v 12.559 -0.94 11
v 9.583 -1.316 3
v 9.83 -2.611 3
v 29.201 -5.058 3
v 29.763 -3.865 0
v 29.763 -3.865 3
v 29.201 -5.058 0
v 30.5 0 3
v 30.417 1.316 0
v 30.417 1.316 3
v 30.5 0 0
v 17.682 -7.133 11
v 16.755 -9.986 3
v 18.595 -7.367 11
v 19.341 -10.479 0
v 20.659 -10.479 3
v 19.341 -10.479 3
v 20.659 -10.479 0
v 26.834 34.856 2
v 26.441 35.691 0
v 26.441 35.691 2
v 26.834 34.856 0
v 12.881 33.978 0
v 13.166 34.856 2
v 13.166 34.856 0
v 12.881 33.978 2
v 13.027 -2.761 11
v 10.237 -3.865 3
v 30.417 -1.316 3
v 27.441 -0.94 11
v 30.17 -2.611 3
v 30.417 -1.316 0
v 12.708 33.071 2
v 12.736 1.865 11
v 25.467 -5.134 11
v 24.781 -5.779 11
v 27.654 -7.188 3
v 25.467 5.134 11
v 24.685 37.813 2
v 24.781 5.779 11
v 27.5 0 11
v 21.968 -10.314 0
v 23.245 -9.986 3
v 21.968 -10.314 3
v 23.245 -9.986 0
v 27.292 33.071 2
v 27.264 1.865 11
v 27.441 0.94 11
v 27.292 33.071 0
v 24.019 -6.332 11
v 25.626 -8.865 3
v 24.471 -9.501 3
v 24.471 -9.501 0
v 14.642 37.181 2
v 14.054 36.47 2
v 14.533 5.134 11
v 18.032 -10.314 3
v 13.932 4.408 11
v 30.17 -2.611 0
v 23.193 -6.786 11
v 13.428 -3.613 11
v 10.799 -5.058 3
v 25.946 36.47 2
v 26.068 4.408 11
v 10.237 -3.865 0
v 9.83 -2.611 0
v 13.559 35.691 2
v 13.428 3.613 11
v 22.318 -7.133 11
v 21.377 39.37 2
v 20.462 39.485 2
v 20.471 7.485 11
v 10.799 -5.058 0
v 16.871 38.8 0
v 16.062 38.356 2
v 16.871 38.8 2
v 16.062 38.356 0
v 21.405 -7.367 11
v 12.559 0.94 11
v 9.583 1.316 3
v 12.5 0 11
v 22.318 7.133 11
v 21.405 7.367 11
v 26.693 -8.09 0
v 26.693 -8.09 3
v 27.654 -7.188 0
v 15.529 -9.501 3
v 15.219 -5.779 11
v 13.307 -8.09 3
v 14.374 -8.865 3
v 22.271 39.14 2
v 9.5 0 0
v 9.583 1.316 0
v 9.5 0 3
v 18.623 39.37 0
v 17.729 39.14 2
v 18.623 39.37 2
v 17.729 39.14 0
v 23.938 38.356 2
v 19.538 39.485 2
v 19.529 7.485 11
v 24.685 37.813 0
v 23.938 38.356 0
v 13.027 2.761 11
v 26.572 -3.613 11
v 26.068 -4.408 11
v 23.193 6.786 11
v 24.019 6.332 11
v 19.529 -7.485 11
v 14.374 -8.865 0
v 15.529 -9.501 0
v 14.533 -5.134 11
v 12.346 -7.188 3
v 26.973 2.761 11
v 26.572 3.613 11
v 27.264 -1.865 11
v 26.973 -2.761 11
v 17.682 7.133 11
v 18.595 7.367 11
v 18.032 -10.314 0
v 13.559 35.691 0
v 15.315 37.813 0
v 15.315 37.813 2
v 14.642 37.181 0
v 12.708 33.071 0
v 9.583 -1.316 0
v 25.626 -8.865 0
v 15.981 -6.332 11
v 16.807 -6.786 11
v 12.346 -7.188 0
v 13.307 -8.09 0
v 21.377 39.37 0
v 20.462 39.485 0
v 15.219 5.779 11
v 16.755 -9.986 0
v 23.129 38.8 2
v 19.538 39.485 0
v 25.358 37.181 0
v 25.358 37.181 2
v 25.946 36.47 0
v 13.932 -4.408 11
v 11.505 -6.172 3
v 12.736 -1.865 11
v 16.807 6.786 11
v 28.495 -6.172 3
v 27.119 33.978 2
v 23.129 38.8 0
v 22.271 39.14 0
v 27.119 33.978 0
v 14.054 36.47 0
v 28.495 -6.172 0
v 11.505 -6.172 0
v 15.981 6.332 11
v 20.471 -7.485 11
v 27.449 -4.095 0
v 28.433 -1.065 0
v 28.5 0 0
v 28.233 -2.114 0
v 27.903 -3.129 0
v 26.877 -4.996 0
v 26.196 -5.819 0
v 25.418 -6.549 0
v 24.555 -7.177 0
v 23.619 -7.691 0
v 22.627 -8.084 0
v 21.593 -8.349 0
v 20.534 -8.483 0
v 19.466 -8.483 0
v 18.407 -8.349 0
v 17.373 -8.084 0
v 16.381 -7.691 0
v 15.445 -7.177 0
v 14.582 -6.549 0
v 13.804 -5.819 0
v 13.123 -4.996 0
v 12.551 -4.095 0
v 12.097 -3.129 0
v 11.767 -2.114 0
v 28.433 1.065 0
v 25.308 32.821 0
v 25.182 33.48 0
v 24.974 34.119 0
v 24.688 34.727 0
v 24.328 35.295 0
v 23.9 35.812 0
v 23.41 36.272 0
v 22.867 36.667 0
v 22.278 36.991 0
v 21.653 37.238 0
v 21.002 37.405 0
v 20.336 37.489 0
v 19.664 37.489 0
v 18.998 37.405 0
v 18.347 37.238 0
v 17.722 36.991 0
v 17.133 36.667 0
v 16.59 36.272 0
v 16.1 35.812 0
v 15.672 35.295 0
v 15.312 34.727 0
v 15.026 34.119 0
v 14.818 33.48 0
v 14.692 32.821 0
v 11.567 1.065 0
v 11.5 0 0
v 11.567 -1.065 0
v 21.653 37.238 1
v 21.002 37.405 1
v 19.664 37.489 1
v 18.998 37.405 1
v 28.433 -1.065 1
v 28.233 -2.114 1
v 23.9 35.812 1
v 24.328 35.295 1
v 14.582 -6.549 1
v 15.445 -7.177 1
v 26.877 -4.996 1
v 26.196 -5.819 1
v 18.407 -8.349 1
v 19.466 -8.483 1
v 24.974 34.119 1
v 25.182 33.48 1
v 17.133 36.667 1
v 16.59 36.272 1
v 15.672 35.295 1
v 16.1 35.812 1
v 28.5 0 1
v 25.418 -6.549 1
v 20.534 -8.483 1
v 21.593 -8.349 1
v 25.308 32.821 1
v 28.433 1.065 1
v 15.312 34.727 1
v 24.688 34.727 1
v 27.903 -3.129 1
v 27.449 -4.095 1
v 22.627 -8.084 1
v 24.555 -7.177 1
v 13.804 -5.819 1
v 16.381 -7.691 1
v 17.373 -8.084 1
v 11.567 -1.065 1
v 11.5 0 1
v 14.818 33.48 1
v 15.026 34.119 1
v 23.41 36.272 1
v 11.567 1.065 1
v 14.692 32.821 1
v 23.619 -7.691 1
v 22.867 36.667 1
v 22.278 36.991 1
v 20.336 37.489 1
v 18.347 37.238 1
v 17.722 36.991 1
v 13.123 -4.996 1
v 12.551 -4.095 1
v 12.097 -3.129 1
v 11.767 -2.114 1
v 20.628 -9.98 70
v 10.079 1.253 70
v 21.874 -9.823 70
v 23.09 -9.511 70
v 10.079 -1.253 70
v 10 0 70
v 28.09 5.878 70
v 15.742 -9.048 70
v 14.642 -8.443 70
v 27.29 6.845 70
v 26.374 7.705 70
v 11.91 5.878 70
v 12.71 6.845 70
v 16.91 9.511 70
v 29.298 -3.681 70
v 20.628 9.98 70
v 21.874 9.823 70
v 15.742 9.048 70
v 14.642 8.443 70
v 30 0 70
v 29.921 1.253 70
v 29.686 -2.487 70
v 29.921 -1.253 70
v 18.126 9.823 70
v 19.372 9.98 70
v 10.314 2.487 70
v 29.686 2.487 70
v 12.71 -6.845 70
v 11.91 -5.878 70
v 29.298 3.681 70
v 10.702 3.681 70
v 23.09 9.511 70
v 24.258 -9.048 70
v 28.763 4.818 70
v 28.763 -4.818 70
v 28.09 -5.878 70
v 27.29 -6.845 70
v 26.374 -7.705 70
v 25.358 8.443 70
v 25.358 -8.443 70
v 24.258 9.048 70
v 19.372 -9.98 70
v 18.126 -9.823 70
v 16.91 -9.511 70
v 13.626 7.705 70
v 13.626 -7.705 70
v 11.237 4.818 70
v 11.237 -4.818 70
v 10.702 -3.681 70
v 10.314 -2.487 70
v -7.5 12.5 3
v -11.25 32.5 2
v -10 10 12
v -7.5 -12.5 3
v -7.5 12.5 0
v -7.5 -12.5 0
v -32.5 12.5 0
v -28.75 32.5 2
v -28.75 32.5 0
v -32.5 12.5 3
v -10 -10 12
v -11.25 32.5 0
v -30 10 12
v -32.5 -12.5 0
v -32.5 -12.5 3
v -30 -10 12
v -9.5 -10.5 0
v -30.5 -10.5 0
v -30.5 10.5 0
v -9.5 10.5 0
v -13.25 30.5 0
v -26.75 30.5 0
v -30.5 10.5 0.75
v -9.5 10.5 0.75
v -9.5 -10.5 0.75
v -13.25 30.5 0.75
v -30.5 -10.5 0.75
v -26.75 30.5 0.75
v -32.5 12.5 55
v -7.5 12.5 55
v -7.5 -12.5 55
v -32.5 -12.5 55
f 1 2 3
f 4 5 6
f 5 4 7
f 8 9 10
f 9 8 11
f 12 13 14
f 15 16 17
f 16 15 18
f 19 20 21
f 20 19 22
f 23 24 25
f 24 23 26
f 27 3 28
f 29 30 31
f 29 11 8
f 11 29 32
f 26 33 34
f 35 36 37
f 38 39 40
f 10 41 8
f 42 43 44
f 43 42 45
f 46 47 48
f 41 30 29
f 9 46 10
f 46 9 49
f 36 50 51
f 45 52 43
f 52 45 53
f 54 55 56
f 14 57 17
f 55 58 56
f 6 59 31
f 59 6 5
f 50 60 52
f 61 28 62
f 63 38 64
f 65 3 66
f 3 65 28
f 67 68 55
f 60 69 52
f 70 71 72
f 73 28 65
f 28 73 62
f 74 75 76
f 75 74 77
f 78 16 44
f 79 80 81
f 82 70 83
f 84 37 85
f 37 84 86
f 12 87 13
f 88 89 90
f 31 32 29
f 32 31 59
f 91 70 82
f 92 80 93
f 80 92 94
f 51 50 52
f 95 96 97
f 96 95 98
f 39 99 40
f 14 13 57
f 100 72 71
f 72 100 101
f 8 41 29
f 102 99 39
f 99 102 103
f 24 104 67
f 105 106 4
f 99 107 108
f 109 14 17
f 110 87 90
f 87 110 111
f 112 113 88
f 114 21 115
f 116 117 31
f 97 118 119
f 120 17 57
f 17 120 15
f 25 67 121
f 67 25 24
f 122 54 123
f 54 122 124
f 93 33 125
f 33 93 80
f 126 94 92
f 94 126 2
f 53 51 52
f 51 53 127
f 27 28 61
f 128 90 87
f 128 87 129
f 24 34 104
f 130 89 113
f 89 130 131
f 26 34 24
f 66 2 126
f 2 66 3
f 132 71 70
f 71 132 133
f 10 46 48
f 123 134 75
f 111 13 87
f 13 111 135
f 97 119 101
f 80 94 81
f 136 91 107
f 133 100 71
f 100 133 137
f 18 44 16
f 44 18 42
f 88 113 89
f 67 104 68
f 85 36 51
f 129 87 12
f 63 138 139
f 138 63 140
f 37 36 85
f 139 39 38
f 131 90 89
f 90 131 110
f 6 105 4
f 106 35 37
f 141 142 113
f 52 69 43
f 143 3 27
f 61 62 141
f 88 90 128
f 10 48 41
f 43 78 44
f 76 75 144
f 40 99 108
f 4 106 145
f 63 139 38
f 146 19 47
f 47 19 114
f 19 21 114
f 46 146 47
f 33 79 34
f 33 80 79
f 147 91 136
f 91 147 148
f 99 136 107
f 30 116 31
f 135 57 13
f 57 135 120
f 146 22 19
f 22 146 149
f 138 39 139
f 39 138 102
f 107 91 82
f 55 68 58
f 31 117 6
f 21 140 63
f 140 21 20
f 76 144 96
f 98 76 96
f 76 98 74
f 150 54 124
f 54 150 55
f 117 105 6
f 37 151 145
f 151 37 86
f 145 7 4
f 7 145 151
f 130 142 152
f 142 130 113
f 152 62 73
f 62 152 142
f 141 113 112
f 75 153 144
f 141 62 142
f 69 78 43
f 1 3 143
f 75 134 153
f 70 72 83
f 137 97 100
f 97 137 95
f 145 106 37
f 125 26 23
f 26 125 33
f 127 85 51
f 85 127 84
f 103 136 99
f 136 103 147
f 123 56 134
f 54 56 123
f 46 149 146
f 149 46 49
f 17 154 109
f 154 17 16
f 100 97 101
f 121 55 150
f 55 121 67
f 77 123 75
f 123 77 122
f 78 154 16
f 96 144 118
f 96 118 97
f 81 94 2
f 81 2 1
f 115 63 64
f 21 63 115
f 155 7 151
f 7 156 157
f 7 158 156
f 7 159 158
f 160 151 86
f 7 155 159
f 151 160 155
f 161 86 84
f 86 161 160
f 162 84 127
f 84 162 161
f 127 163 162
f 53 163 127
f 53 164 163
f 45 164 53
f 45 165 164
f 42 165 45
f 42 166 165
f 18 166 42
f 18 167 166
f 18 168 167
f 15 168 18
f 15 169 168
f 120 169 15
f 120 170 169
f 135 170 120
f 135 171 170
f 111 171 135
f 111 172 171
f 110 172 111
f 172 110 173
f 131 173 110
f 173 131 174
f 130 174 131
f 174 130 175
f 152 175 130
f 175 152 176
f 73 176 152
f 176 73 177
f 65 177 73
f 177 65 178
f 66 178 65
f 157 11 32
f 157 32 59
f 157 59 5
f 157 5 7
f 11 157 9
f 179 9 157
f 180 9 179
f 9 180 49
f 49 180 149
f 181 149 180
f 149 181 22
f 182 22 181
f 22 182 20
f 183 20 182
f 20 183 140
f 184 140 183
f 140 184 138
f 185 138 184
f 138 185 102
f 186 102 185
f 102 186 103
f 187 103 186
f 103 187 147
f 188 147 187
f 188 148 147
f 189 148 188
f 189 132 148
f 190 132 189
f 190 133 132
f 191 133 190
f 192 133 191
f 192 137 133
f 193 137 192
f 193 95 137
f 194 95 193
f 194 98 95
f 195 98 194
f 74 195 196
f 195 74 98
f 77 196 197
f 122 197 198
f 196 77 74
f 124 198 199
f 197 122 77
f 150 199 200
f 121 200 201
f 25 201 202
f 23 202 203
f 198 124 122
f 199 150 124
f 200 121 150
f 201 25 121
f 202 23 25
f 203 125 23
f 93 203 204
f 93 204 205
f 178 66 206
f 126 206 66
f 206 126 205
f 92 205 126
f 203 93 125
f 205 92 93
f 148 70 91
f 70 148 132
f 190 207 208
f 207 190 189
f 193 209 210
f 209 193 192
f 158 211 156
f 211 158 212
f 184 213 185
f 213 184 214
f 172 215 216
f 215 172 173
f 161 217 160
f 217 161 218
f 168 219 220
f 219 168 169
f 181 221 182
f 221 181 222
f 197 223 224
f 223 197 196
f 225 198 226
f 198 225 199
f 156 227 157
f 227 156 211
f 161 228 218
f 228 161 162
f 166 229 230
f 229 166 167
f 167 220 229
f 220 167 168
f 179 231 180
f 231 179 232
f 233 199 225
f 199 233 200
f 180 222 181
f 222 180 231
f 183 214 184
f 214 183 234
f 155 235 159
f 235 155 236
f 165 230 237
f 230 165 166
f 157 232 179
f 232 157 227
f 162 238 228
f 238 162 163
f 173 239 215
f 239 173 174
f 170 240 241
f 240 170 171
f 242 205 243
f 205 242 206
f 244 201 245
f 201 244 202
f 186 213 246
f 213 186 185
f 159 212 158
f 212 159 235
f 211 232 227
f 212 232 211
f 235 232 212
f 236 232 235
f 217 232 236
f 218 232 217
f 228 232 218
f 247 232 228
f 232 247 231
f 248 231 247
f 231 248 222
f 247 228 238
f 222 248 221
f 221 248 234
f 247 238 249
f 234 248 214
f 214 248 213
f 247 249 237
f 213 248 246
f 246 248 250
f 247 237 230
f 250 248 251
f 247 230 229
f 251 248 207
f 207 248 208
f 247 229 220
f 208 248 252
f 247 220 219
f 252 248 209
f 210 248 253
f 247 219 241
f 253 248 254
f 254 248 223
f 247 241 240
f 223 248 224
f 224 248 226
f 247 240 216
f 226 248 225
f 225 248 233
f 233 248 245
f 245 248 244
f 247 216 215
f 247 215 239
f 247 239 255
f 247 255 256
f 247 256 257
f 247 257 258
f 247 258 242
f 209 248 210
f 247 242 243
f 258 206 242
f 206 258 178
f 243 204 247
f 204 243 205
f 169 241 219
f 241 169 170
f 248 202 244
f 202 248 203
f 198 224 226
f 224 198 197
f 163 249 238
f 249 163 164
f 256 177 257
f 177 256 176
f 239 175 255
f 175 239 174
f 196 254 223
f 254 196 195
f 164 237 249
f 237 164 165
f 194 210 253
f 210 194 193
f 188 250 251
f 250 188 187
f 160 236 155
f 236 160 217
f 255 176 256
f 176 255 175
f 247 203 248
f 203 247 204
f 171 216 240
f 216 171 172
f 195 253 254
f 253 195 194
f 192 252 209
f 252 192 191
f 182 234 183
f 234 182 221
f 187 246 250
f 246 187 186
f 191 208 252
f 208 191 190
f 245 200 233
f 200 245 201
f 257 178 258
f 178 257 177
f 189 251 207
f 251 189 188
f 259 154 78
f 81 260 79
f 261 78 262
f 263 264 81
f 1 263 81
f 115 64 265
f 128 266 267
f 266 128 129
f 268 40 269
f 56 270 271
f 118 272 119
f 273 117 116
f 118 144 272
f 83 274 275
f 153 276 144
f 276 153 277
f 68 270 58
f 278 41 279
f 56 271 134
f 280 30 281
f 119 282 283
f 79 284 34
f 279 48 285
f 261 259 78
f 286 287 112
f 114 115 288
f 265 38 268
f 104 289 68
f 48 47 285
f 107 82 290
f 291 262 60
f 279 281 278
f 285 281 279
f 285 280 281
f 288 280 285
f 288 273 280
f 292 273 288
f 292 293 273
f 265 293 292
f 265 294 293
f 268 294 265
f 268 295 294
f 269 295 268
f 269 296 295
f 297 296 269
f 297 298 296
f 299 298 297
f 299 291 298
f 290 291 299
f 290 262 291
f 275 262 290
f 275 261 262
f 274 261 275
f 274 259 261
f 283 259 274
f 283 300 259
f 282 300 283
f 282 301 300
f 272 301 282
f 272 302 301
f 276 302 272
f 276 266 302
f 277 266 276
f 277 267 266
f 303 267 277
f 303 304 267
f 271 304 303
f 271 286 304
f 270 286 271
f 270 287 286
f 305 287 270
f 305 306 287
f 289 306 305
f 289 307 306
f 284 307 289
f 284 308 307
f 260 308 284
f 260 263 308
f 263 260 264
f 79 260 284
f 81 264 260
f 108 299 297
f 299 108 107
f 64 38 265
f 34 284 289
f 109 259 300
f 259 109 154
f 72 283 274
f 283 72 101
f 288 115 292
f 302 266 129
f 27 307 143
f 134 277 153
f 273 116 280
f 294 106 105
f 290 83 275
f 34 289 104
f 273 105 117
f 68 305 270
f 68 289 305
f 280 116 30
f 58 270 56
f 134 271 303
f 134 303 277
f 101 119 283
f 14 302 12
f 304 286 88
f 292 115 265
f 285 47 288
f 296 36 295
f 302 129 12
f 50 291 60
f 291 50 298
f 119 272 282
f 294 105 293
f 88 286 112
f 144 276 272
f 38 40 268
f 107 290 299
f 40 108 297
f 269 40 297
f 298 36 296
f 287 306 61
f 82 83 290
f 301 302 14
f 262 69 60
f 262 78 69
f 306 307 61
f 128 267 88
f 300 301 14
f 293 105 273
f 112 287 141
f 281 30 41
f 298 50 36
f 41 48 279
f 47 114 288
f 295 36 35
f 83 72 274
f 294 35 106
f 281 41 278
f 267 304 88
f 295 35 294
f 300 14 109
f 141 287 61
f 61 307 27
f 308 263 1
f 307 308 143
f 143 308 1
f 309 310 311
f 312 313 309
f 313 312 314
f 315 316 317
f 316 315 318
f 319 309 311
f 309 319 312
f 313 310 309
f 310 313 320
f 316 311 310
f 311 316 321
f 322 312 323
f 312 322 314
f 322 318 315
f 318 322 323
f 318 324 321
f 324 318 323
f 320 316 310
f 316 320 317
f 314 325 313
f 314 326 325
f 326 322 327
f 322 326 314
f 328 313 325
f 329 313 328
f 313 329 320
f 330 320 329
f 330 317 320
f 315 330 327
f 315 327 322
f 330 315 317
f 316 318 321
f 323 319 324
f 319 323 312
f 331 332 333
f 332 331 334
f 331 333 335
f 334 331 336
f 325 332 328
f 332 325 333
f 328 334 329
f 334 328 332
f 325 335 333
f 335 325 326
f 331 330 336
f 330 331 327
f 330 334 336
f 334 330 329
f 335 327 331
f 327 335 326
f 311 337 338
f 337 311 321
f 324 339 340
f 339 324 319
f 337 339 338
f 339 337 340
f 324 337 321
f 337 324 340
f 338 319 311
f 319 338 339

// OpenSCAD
// file: ../utilities/transformations_oblomobka.scad
// Transformations
// (C) @oblomobka - 2014
// GPL3

// Transforma una forma en un sector según un ángulo dado.

module sector(	angle, 	// es el ángulo del sector, lo que quedará de la forma original
				d,		// valor auxiliar, será como mínimo igual al diámetro del cilindro que envuelve la forma original
				h		// valor auxiliar, será como mínimo igual a la altura del cilindro que envuelve la forma original
				){

POINTS=[	[0,0,-h],
		[0,0,h],
		[d*cos(0*angle/4),d*sin(0*angle/4),-h],
		[d*cos(0*angle/4),d*sin(0*angle/4),h],
		[d*cos(1*angle/4),d*sin(1*angle/4),-h],
		[d*cos(1*angle/4),d*sin(1*angle/4),h],
		[d*cos(2*angle/4),d*sin(2*angle/4),-h],
		[d*cos(2*angle/4),d*sin(2*angle/4),h],
		[d*cos(3*angle/4),d*sin(3*angle/4),-h],
		[d*cos(3*angle/4),d*sin(3*angle/4),h],
		[d*cos(4*angle/4),d*sin(4*angle/4),-h],
		[d*cos(4*angle/4),d*sin(4*angle/4),h],
		];

TRIANGLES=[	[0,1,2],
			[1,3,2],
			[2,3,4],
			[3,5,4],
			[4,5,6],
			[5,7,6],
			[6,7,8],
			[7,9,8],
			[8,9,10],
			[9,11,10],
			[10,11,0],
			[11,1,0],

			[5,3,1],
			[7,5,1],
			[9,7,1],
			[11,9,1],
			[0,2,4],
			[0,4,6],
			[0,6,8],
			[0,8,10]
			];

if(angle<=0 || angle>=360){
	child();
	}
	else{
		intersection(){
			polyhedron(points=POINTS,triangles=TRIANGLES);
			child();
			}
		}
}

//sector (150,40,10)cylinder(r=20,h=10); // Ejemplo de uso de la tansformación sector()
// file: ../utilities/functions_ext.scad
// Funciones sacadas de otras librerías y de diferentes autores

include <constants_oblomobka.scad>

/* A circular helix of radius a and pitch 2πb is described by the following parametrisation:
x(t) = a*cos(t),
y(t) = a*sin(t),
z(t) = b*t
Licensed under the MIT license.
© 2010 by Elmo Mäntynen
*/
function b(pitch) = pitch/(TAU);
function t(pitch, z) = z/b(pitch);
function helix_curve(pitch, radius, z) = [radius*cos(deg(t(pitch, z))), radius*sin(deg(t(pitch, z))), z];


/* Utility functions.
 * Originally by Hans Häggström, 2010.
 * Dual licenced under Creative Commons Attribution-Share Alike 3.0 and LGPL2 or later
 */
function distance(a, b) = sqrt( (a[0] - b[0])*(a[0] - b[0]) +
                                (a[1] - b[1])*(a[1] - b[1]) +
                                (a[2] - b[2])*(a[2] - b[2]) );

function length2(a) = sqrt( a[0]*a[0] + a[1]*a[1] );

function normalized(a) = a / (max(distance([0,0,0], a), 0.00001));

function normalized_axis(a) = 	a == "x" ? [1, 0, 0]:
                  			 	a == "y" ? [0, 1, 0]:
                   				a == "z" ? [0, 0, 1]: normalized(a);

function angleOfNormalizedVector(n) = [0, -atan2(n[2], length2([n[0], n[1]])), atan2(n[1], n[0]) ];

function angle(v) = angleOfNormalizedVector(normalized(v));

function angleBetweenTwoPoints(a, b) = angle(normalized(b-a));
// file: ../utilities/constants_oblomobka.scad
// números transcendentes

TAU = 2*PI; //6.2831853071 (PI ya está definido en Openscad)
EULER=2.71828282;


// números algebraicos

PHI=(1+sqrt(5))/2;


// Vectores

X = [1, 0, 0];
Y = [0, 1, 0];
Z = [0, 0, 1];
// file: hip.scad
//////////////////////////////////////////////////////////////////////////////////////////////////
// HIP[OBLOBOTS] 
// preform
//////////////////////////////////////////////////////////////////////////////////////////////////
// (c) Jorge Medal (@oblomobka) - Sara Alvarellos (@trecedejunio) 2014-04 v.10
//////////////////////////////////////////////////////////////////////////////////////////////////
// GPL license
//////////////////////////////////////////////////////////////////////////////////////////////////

include <../utilities/external_elements_oblobots.scad>
include <../utilities/presets_oblobots.scad>
include <../utilities/limits_oblobots.scad>

use <../utilities/functions_oblomobka.scad>
use <../utilities/shapes_oblomobka.scad>


//////////////////////////////////////////////////////////////////
/////////////////// MODULO hip_cylindrical  //////////////////////

module hip_cylindrical(hip=[40,15,80]){	// [ d,h,f ] Medidas de la cadera

// valores con límites: acotados entre un máximo y un mínimo (los valores límite están en <limits_oblobots.scad>)
d_hip=lim(d_hip_minmax[0],hip[0],d_hip_minmax[1]);
h_hip=lim(h_hip_minmax[0],hip[1],h_hip_minmax[1]);
f_hip=lim(f_hip_minmax[0],hip[2],f_hip_minmax[1]);

// variables condicionadas a los valores de entrada
h1_hip=h_hip-f_hip*h_hip/110;
h2_hip=h_hip-h1_hip;

d1_hip=max(3*d_hip/4,(d_hip-2*h1_hip));  // diámetro inferior de la cadera

$fn=50;

// --------- Volumen ----------------

union(){
	cylinder(r1=d1_hip/2,r2=d_hip/2,h=h1_hip);
	translate([0,0,h1_hip])
		cylinder (r=d_hip/2,h=h2_hip);	
	}
}
// -------------- Fin del módulo hip_cylindrical() ------------------------
// ------------------------------------------------------------------------


//////////////////////////////////////////////////////////////////
/////////////////// MÓDULO hip_quadrangle()  /////////////////////

module hip_quadrangle (hip=[40,22,18,3]){			// [ ancho(x), fondo(y), altura(z), chaflán ] Medida de la cadera


x_hip=lim(x_hip_minmax[0],hip[0],x_hip_minmax[1]);			// medida de la cadera: ancho
y_hip=lim(y_hip_minmax[0],hip[1],y_hip_minmax[1]);			// medida de la cadera: fondo
z_hip=lim(z_hip_minmax[0],hip[2],z_hip_minmax[1]);			// medida de la cadera: alto
bevel_hip=lim(bevel_hip_minmax[0],hip[3],bevel_hip_minmax[1]);;		// medida de la cadera: chaflán

// Volumen
difference(){
	translate([0,0,z_hip/2])
		cube ([x_hip,y_hip,z_hip],center=true);
	for(i=[	[1,1,0],
			[1,-1,-90],
			[-1,1,90],
			[-1,-1,180]]){
		translate([i[0]*x_hip,i[1]*y_hip,0]/2)
			rotate([0,0,i[2]])rotate(45*[0,1,1])
				cube([min(2*bevel_hip,((y_hip-1)/2)),x_hip,x_hip],center=true);
		}
	}
}
// ------------ Fin del módulo hip_quadrangle(hip[x,y,z,b]) -------------
// ----------------------------------------------------------------------


/////////////////////////////////////////////////////////////////////////
/////////////////// Ejemplos de aplicación //////////////////////////////

i=35;

translate([i,0,0])
	hip_cylindrical(hip=[60,21,90]);

translate([-i,0,0])
	hip_quadrangle(hip=[50,25,25,4]);
// file: ../utilities/shapes_oblomobka.scad
// Shapes
// (C) @oblomobka - 2014
// GPL3

include <constants_oblomobka.scad>
include <functions_oblomobka.scad>
include <functions_ext.scad>

use <transformations_oblomobka.scad>

// --- Piramide con base circunscrita en un círculo definido en las variables
module pyramid_circumscribed (	n=4,			// nº lados de la base de la pirámide	
								d1=20,		// diámetro del círculo-base donde se circunscribe la pirámide
								d2=0,		// diámetro del círculo-punta donde se circunscribe la pirámide
								h=10			// altura de la pirámide
								){

if(n%2==0){
	rotate([0,0,180/n])
		cylinder (r1=d1/2/cos(180/n), r2=d2/2/cos(180/n), h=h, $fn=n);
	}
	else{
		rotate([0,0,90/n])
			cylinder (r1=d1/2/cos(180/n), r2=d2/2/cos(180/n), h=h, $fn=n);
		}

}
// ------- pyramid_circumscribed (n=n,d1=d1,d2=d2,h=h); -----------------

// --- Prisma con base circunscrita en un círculo definido en las variables
module prism_circumscribed (	n=4,			// nº lados de la base del prisma
							d=20,		// diámetro del círculo donde se circunscribe el prisma
							h=10			// altura del prisma
							){
if(n%2==0){
	rotate([0,0,180/n])
		cylinder (r=d/2/cos(180/n), h=h, $fn=n);
	}
	else{
		rotate([0,0,90/n])
			cylinder (r=d/2/cos(180/n), h=h, $fn=n);
		}
}
// ------- prism_circumscribed (n=n,d=d,h=h); -----------------



// Toros

// Definido por el diámetro exterior y el diámetro del círculo en revolución
module torusOD (d1,d2,resolution){
$fn=resolution;	
rotate_extrude(){
	translate([d1/2-d2/2,0,0])
		circle(r=d2/2);
	}
}

// Definido por el diámetro exterior y el diámetro interior
module torusOI (d1,d2,resolution){
$fn=resolution;	
d=(d1-d2)/2;
rotate_extrude(){
	translate([d1/2-d/2,0,0])
		circle(r=d/2);
	}
}

// Definido por el diámetro de la línea neutra y el diámetro del círculo en revolución
module torusND (d1,d2,resolution){
$fn=resolution;	
rotate_extrude(){
	translate([d1/2,0,0])
		circle(r=d2/2);
	}
}

module torus_sector(d1,d2,angle=360,mode=1,extreme=true,resolution=32){

if(angle<=0 || angle>=360){
	if(mode==1){torusOD(d1,d2,resolution=resolution);}
	else{if(mode==2){torusND(d1,d2,resolution=resolution);}
	else{if(mode==3){torusOI(d1,d2,resolution=resolution);}}}
	}

else{
	if(mode==1){
		union(){
			sector(angle,d1,d2/2)torusOD(d1,d2,resolution=resolution);
			if(extreme==true){
				translate([d1/2-d2/2,0,0])sphere(d2/2,$fn=resolution);
				translate([(d1/2-d2/2)*cos(angle),(d1/2-d2/2)*sin(angle),0])sphere(d2/2,$fn=resolution);
				}
			}
		}
	else{
		if(mode==2){
			union(){
				sector(angle,d1+d2,d2/2)torusND(d1,d2,resolution=resolution);
				if(extreme==true){
					translate([d1/2,0,0])sphere(d2/2,$fn=resolution);
					translate([d1/2*cos(angle),d1/2*sin(angle),0])sphere(d2/2,$fn=resolution);
					}
				}
			}
		else{
			if(mode==3){
				union(){
					sector(angle,d1,(d1-d2)/4)torusOI(d1,d2,resolution=resolution);
					if(extreme==true){
						translate([d1/2-(d1-d2)/4,0,0])sphere((d1-d2)/4,$fn=resolution);
						translate([(d1/2-(d1-d2)/4)*cos(angle),(d1/2-(d1-d2)/4)*sin(angle),0])sphere((d1-d2)/4,$fn=resolution);
						}
					}
				}
			}
		}
	}
}


// Tubos

module tubeOT (d,t,h,resolution=resolution){	
	difference(){
		cylinder(r=d/2,h=h,$fn=resolution);
		cylinder(r=(d-2*t)/2,h=3*h,center=true,$fn=resolution);
		}
}

// Definido por el diámetro exterior y el diámetro interior
module tubeOI (d1,d2,h,resolution=resolution){
	difference(){
		cylinder(r=d1/2,h=h,$fn=resolution);
		cylinder(r=d2/2,h=3*h,center=true,$fn=resolution);	
		}
}

// Definido por el diámetro de la línea neutra y el diámetro del círculo en revolución
module tubeNT (d,t,h,resolution=resolution){
	difference(){
		cylinder(r=(d+t)/2,h=h,$fn=resolution);
		cylinder(r=(d-t)/2,h=3*h,center=true,$fn=resolution);
	}
}

module tube_sector(d=25,t=2,h=1,angle=360,mode=1,extreme=true,resolution=32){

if(angle<=0 || angle>=360){
	if(mode==1){tubeOT(d,t,h,resolution=resolution);}
	else{if(mode==2){tubeNT(d,t,h,resolution=resolution);}
	else{if(mode==3){tubeOI(d,t,h,resolution=resolution);}}}
	}

else{
	if(mode==1){
		union(){
			sector(angle,d,h)tubeOT(d,t,h,resolution=resolution);
			if(extreme==true){
				translate([d/2-t/2,0,0])cylinder(r=t/2,h=h,$fn=resolution);
				translate([(d/2-t/2)*cos(angle),(d/2-t/2)*sin(angle),0])cylinder(r=t/2,h=h,$fn=resolution);;
				}
			}
		}
	else{
		if(mode==2){
			union(){
				sector(angle,d+t,h)tubeNT(d,t,h,resolution=resolution);
				if(extreme==true){
					translate([d/2,0,0])cylinder(r=t/2,h=h,$fn=resolution);
					translate([d/2*cos(angle),d/2*sin(angle),0])cylinder(r=t/2,h=h,$fn=resolution);
					}
				}
			}
		else{
			if(mode==3){
				union(){
					sector(angle,d,h)tubeOI(d,t,h,resolution=resolution);
					if(extreme==true){
						translate([d/2-(d-t)/4,0,0])cylinder(r=(d-t)/4,h=h,$fn=resolution);
						translate([(d/2-(d-t)/4)*cos(angle),(d/2-(d-t)/4)*sin(angle),0])cylinder(r=(d-t)/4,h=h,$fn=resolution);
						}
					}
				}
			}
		}
	}
}

//torus_sector(d1=15,d2=4,angle=215,mode=3,extreme=true,resolution=50);
//tube_sector(d=24,t=11,h=15,angle=250,mode=1,extreme=true,resolution=50);

pyramid_circumscribed(n=10,d=8,h=4);
// file: ../utilities/functions_oblomobka.scad
// Functions
// (C) @oblomobka - 2014
// GPL3

include <constants_oblomobka.scad>

// da el diámetro interior del cono(d1,d2,h) a una altura interior(hi) conocida
function di_cone(d1,d2,h,hi)=d2+(d1-d2)*(1-hi/h);

// da la altura interior del cono(d1,d2,h) a un diametro(di) conocido
function hi_cone(d1,d2,h,di)=-h*((di-d2)/(d1-d2)-1);

// 
function r_circle_intersection (d1,d2)=sqrt(pow(d1/2,2)-pow(d2/2,2));

// Relaciones entre radio, apotema y lado en un polígono de n lados
function side_apothem (apothem,n)=apothem*2*tan(180/n);
function apothem_radius(radius,n)=radius*cos(180/n);
function radius_apothem(apothem,n)=apothem/cos(180/n);
function side_radius (radius,n)=radius*2*sin(180/n);

// limita los posibles valores de x, que siempre estarán comprendidos entre un minimo(a) y un maximo(z)
function lim(a,x,z)=max(a,min(x,z));

// transforma angulo, radianes --> hexadecimal
function deg(angle) = 180*angle/PI;
// transforma angulo, hexadecimal --> radianes
function rad(angle) = angle*PI/180;
// file: ../utilities/limits_oblobots.scad
//PIN
	d_pin_minmax=[10,30];			//	d_pin=lim(d_pin_minmax[0],pin[0],d_pin_minmax[1]);			
	h_pin_minmax=[0,10];			//	h_pin=lim(h_pin_minmax[0],pin[1],h_pin_minmax[1]);

//LEGS & FOOTS
	d_leg_minmax=[10,30];			//	d_leg=lim(d_leg_minmax[0],leg[0],d_leg_minmax[1]);
	h_leg_minmax=[20,90];			//	h_leg=lim(h_leg_minmax[0],leg[1],h_leg_minmax[1]);	
	n_leg_minmax=[4,16];			//	n_leg=lim(n_leg_minmax[0],leg[2],n_leg_minmax[1]);
	legsposition_minmax=[0,100];	// 	legsposition=lim(legsposition_minmax[0],leg[1],legsposition_minmax[1]);

	l_foot_minmax=[24,70];		//	l_foot=lim(l_foot_minmax[0],foot[0],l_foot_minmax[1]);
	h_foot_minmax=[0,40];			//	h_foot=lim(h_foot_minmax[0],foot[1],h_foot_minmax[1]);

//HIP | WAIST
	//C
	d_hip_minmax=[25,80];			//	d_hip=lim(d_hip_minmax[0],hip[0],d_hip_minmax[1]);
	h_hip_minmax=[10,70];			//	h_hip=lim(h_pin+2,hip[1],h_hip_minmax[1]);
	f_hip_minmax=[0,100];			//	f_hip=lim(f_hip_minmax[0],hip[2],f_hip_minmax[1]);

								//	d1_waist=lim(d_pin,waist[0],d_hip);
								//	d2_waist=lim(d_pin,waist[1],d1_waist);
	h_waist_minmax=[0.3,20];		//	h_waist=lim(h_waist_minmax[0],waist[2],h_waist_minmax[1]);

	
	//Q
	x_hip_minmax=[20,90];			//	x_hip=lim(x_hip_minmax[0],hip[0],x_hip_minmax[1]);
	y_hip_minmax=[20,60];			//	y_hip=lim(y_hip_minmax[0],hip[1],y_hip_minmax[1]);
	z_hip_minmax=[10,60];			//	z_hip=lim(z_hip_minmax[0],hip[2],z_hip_minmax[1]);
	bevel_hip_minmax=[0.5,20];	//	bevel_hip=lim(bevel_hip_minmax[0],hip[3],bevel_hip_minmax[1]);

	n_waist_minmax=[4,50];		//	n_waist=lim(n_waist_minmax[0],waist[3],n_waist_minmax[1]);
								//	d1_waist=lim(d_pin,waist[0],min(x_hip,y_hip));
								//	d2_waist=lim(d_pin,waist[1],d1_waist);


//TRUNK | SHOULDER | NECK
	//C
	d1_trunk_minmax=[30,100];		//	d1_trunk=lim(d1_trunk_minmax[0],trunk[0],d1_trunk_minmax[1]); 
	d2_trunk_minmax=[30,100];		//	d2_trunk=lim(d2_trunk_minmax[0],trunk[1],d1_trunk);
	h_trunk_minmax=[24,100];		//	h_trunk=lim(h_trunk_minmax[0],trunk[2],h_trunk_minmax[1]);

	d1_shoulder_minmax=[12,50];	//	d1_shoulder=lim(d1_shoulder_minmax[0],shoulder[0],h_trunk*sin(angle_trunk));
	d_aux_shoulder_minmax=[0,10];	//	d_aux_shoulder=lim(d_aux_shoulder_minmax[0],shoulder[1],d_aux_shoulder_minmax[1]);
	h_shoulder_minmax=[0,50];		//	h_shoulder=lim(h_shoulder_minmax[0],shoulder[2],d2_trunk/2);

								//	d1_neck=lim(d_pin+2,neck[0],d2_trunk);
								//	d2_neck=lim(d_pin+2,neck[1],d1_neck);
	h_neck_minmax=[0.3,20];		//	h_neck=lim(h_neck_minmax[0],neck[2],h_neck_minmax[1]);

	//Q
	x_trunk_minmax=[20,90];		//	x_trunk=lim(x_trunk_minmax[0],trunk[0],x_trunk_minmax[1]);
	y_trunk_minmax=[20,90];		//	y_trunk=lim(d_pin+1+x_trunk/5,trunk[1],y_trunk_minmax[1]);
	z_trunk_minmax=[26,90];		//	z_trunk=lim(z_trunk_minmax[0],trunk[2],z_trunk_minmax[1]);
	
	n_neck_minmax=[4,50];			//	n_neck=lim(n_neck_minmax[0],neck[3],n_neck_minmax[1]);
								//	d1_neck=lim(d_pin+2,neck[0],min(x_trunk,y_trunk));	
								//	d2_neck=lim(d_pin+2,neck[1],d1_neck);

	//ELECTRIC TRUNK
	d_polygonal_trunk_minmax=[45,80];	//d_polygonal_trunk=lim(d_polygonal_trunk_minmax[0],trunk[0],d_polygonal_trunk_minmax[1]);							
	h_polygonal_trunk_minmax=[87,120];	//h_polygonal_trunk=lim(h_polygonal_trunk_minmax[0],trunk[1],h_polygonal_trunk_minmax[1]);
	thickness_trunk_minmax=[1,6];	//thickness_trunk=lim(thickness_trunk_minmax[0],trunk[2],thickness_trunk_minmax[1]);

// ARMS | HANDS
	// C
	d_arm_minmax=[10,40];			// 	d_arm=lim(d_arm_minmax[0],arm[0],d_arm_minmax[1]);
								//	d_arm=lim(d_pin+1,arm[0],d_arm_minmax[1]);	
	h_arm_minmax=[5,25];			// 	h_arm=lim(h_arm_minmax[0],arm[1],h_arm_minmax[1]);
	armpit_minmax=[0.3,60];		//	armpit=lim(armpit_minmax[0],arm[2],armpit_minmax[1]);
	l_arm_minmax=[20,120];		// 	l_arm=lim(d_arm+d_hand,arm[2],l_arm_minmax[1]);	

	d_hand_minmax=[10,60];		//	d_hand=lim(d_hand_minmax[0],hand[0],d_hand_minmax[1]);
	h_hand_minmax=[3,25];			//	h_hand=lim(h_hand_minmax[0],hand[1],h_arm-0.5);
	angle_hand_minmax=[0,180];	//	angle_hand=lim(angle_hand_minmax[0],hand[2]/2,angle_hand_minmax[1]);

	// Q
	x_arm_minmax=[5,25];			// 	x_arm=lim(x_arm_minmax[0],arm[1],x_arm_minmax[1]);
	y_arm_minmax=[10,40];			// 	y_arm=lim(y_arm_minmax[0],arm[0],y_arm_minmax[1]);
	z_arm_minmax=[20,120];		//	z_arm=lim(y_arm+5+d_hand,arm[2],z_arm_minmax[1]);

	n_hand_minmax=[4,12];			// 	n_hand=lim(n_hand_minmax[0],2*floor(hand[2]/2),n_hand_minmax[1]);
								//	h_hand=lim(h_hand_minmax[0],hand[1],x_arm-0.5);

// HEAD | EYES | BRAIN
	// C
	h_head_minmax=[20,100];		// 	h_head=lim(h_head_minmax[0],head[2],h_head_minmax[1]);
	d1_head_minmax=[20,60];		// 	d1_head=lim(h_head_minmax[0],head[0],h_head_minmax[1]);
	d2_head_minmax=[15,150];		// 	d2_head=lim(h_head_minmax[0],head[1],2*h_head+d1_head);

	// Q
	x_head_minmax=[20,100];		// x_head=lim(x_head_minmax[0],head[0],x_head_minmax[1]);
	y_head_minmax=[20,100];		// y_head=lim(y_head_minmax[0],head[1],y_head_minmax[1]);
	z_head_minmax=[20,100];		// z_head=lim(z_head_minmax[0],head[2],z_head_minmax[1]);

	d_eye_minmax=[5,40];			// 	d_eye=lim(d_eye_minmax[0],eye[0],(d1_head+d2_head)/2);
	h_eye_minmax=[1,10];			// 	h_eye=lim(h_eye_minmax[0],eye[1],h_eye_minmax[1]);
	edge_eye_minmax=[1,12];		//	edge_eye=lim(edge_eye_minmax[0],eye[2],d_eye/2-3);

	frown_eye_expression_minmax=[0,100];		// frown_eye_expression=lim(frown_eye_expression_minmax[0],eye_expression[1],frown_eye_expression_minmax[1]);
	bridge_eye_position_minmax=[0,100];		// bridge_eye_position=lim(bridge_eye_position_minmax[0],eye_position[0],bridge_eye_position_minmax[1]);	
	f_h_eye_position_minmax=[0,100];			// f_h_eye_position=lim(f_h_eye_position_minmax[0],eye_position[1],f_h_eye_position_minmax[1]);	

	h_brain_minmax=[0,40];			//	h_brain=lim(h_brain_minmax[0],brain[0],h_brain_minmax[1]);
	edge_brain_minmax=[0,25];			//	edge_brain=lim(edge_brain_minmax[0],brain[1],edge_brain_minmax[1]);

//BADGE
	d_badge_minmax=[20,40];		//	d_badge=lim(d_badge_minmax[0],badge[0],d_badge_minmax[1])
	h_badge_minmax=[0.5,5];		// 	h_badge=lim(h_badge_minmax[0],badge[1],h_badge_minmax[1]);
	n_badge_minmax=[4,50];		// 	n_badge=lim(n_badge_minmax[0],badge[3],n_badge_minmax[1]);
	edge_badge_minmax=[1,5];		//	edge_badge=lim(edge_badge_minmax[0],badge[2],edge_badge_minmax[1]);
// file: ../utilities/presets_oblobots.scad
//////////////////////////////////////////////////////////////////////////////////////////////////
// presets [OBLOBOTS] 
// valores predeterminados para los volúmenes de un oblobot así como de los modos de represntación
//////////////////////////////////////////////////////////////////////////////////////////////////
// (c) Jorge Medal (@oblomobka) - Sara Alvarellos (@trecedejunio) Oct 2013
//////////////////////////////////////////////////////////////////////////////////////////////////
// GPL license
//////////////////////////////////////////////////////////////////////////////////////////////////

use <functions_oblomobka.scad>


//-- CARACTERÍSTICAS DEL PIN

SIMPLE=[0,0,0];					// cilindro 

	// Pestañas en pin con punta expandible
	tab_expansion=80;
	TABWIDE=[35,35,tab_expansion];
	TABNORMAL=[50,50,tab_expansion];
	TABFINE=[65,65,tab_expansion];

/////////////////////////////////////////////
/////// REPRESENTACIÓN //////////////////////
/////////////////////////////////////////////

//-- MODOS DE REPRESENTACIÓN DE LAS PARTES 

ASSEMBLED=[0,1,0,0];
EXPLOSION=[0,1,1,1];
PRINTING=[1,0,0,2];


//-- ELECCIÓN DE LA PARTE REPRESENTADA	

ALL=[0];
LEGS=[1];
HIP=[2];
TRUNK=[3];
HEAD=[4];
ARMS=[5];
BADGES=[6];

//-- COLORES

arms_color=[1,rands(100,200,1)[0]/255,0];
legs_color=[0,rands(100,200,1)[0]/255,1];
trunk_color=[rands(0,100,1)[0]/255,rands(150,225,1)[0]/255,rands(0,100,1)[0]/255];
head_color=[220/255,rands(0,100,1)[0]/255,20/255];
badges_color=[rands(0,255,1)[0]/255,rands(0,255,1)[0]/255,rands(0,255,1)[0]/255];
hip_color=[0,(rands(100,200,1)[0])/255,1];
// file: ../utilities/external_elements_oblobots.scad
//////////////////////////////////////////////////////////////////////////////////////////////////
// external elements [OBLOBOTS] 
// librería de elementos externos comerciales (botones automáticos, espigas de madera baterías, ...) 
// que se usan en las partes de los oblobots
//////////////////////////////////////////////////////////////////////////////////////////////////
// (c) Jorge Medal (@oblomobka) - Sara Alvarellos (@trecedejunio) 2014-02
//////////////////////////////////////////////////////////////////////////////////////////////////
// GPL license
//////////////////////////////////////////////////////////////////////////////////////////////////

//-- BOTONES AUTOMÁTICOS - Press Fastener (PF)
//-- Cada código corresponde a las medidas de un modelo concreto

//XXX= [ xx,xx,xx,xx,xx,xx,xx ];		// [ 	diametro hembra,
									//		espesor hembra,
									//		diámetro alojamiento en hembra (aparece en los botones para coser),
									//		saliente del alojamiento en hembra (aparece en los botones para coser),
									//		diámetro macho,
									//		espesor macho	
									//		tipo]

NULL=[0,0,0,0,0,0,0];				// no hay botón automático 
//PON = [11.7,2.35,0,0,11.7,1.6 ];	// marca desconocida, encontrado en Pontejos (Madrid)
//PRYM10 = [11,2.2,0,0,11,2.0];		// marca PRYM - 10 mm
PRYM_SNAP_FASTENERS_11 = [10.1,1.4,3.5,3,9.1,1,2];	// marca PRYM - Snap fasteners 11mm
PRYM_SNAP_FASTENERS_9 = [8.5,1.5,3,2.7,8.1,1,2];	// marca PRYM - Snap fasteners 9mm

fit_male=0.7;

//-- Espigas de madera - DOWEL

DOWEL_8=[8,40,0,0,0,0,1];
DOWEL_6=[6,30,0,0,0,0,1];

//-- TUBOS DE PLÁSTICO

PIPE_6=[6,20,0,0,0,0,1];



//-- BATERÍAS CILÍNDRICAS

//XX= [ xx,xx ];		// [ 	diametro de la pila,
					//		longitud	de la pila	]

AA = [ 14.5, 50.5 ];
AAA = [ 10.5,44.5 ];
C = [ 26.2, 50 ];
D = [ 34.2, 61.5 ]; 
// main file
//////////////////////////////////////////////////////////////////////////////////////////////////
// Leg[OBLOBOTS] 
// preform
//////////////////////////////////////////////////////////////////////////////////////////////////
// (c) Jorge Medal (@oblomobka) - Sara Alvarellos (@trecedejunio) 2014-04 v.10
//////////////////////////////////////////////////////////////////////////////////////////////////
// GPL license
//////////////////////////////////////////////////////////////////////////////////////////////////

include <../utilities/external_elements_oblobots.scad>
include <../utilities/presets_oblobots.scad>
include <../utilities/limits_oblobots.scad>

use <../utilities/functions_oblomobka.scad>
use <../utilities/shapes_oblomobka.scad>

use <hip.scad>


/////////////////////////////////////////////////////////////////
/////////////////// MÓDULO leg_cylindrical()  ///////////////////

module leg_cylindrical (	leg=[12,45],		// [d,h] Medidas de la pierna (la altura incluye el pie)
						foot=[40,5]		// [long,h] Medidas del pie
						){
$fn=50;

// valores con límites: acotados entre un máximo y un mínimo (los valores límite están en <limits_oblobots.scad>)
d_leg=lim(d_leg_minmax[0],leg[0],d_leg_minmax[1]);			// medida de la pierna: diámetro
h_leg=lim(h_leg_minmax[0],leg[1],h_leg_minmax[1]);			// medida de la pierna: longitud

l_foot=lim(l_foot_minmax[0],foot[0],l_foot_minmax[1]);		// medida del pie: longitud	
h_foot=lim(h_foot_minmax[0],foot[1],h_foot_minmax[1]);		// medida del pie: altura (sin contar la altura de la base (heel))

// variables condicionadas a los valores de entrada
//legdtop=legd+1;					// medida de la pierna: grosor superior 
ankle=max(d_leg-5,7);				// medida de la pierna: grosor inferior

d_foot=ankle+6;				// medida del pie: ancho en el talón
d_pointfoot=d_foot*0.7;				// medida del pie: ancho en la punta

l_i_foot=l_foot-(d_pointfoot+d_foot)/2;

heel=3;							// talón, altura de la base

h_i_leg=h_leg-h_foot-heel;

// Volumen
rotate([0,0,90])
	union(){
		translate([0,0,heel+h_foot])
			// Canilla
			cylinder (r2=d_leg/2,r1=ankle/2,h=h_i_leg);
				// Pie				
				difference(){
					hull(){
						cylinder (r=d_foot/2,h=heel);
						translate([0,-l_i_foot,0])
							cylinder (r=d_pointfoot/2,h=2);
						translate([0,0,heel])
							cylinder(r=ankle/2,h=h_foot);
						}

					hull(){
						cylinder (r=(d_foot-4)/2,h=2,center=true);
						translate([0,-l_i_foot,0])
							cylinder (r=(d_pointfoot-4)/2,h=2,center=true);
						}
					}
		}
}
// -------------- Fin del módulo leg_cylindrical() ------------------------
// ------------------------------------------------------------------------


//////////////////////////////////////////////////////////////////
///////////// MÓDULO leg_quadrangle ();  ////////////////////

module leg_quadrangle (	leg=[10,15,8], 		// [ d, h, num de lados ] Medidas de la pierna (incluye el pie)
						foot	=[35,4]			// [ long, h ] Medidas dele pie
						){

// valores con límites: acotados entre un máximo y un mínimo (los valores límite están en <limits_oblobots.scad>)
d_leg=lim(d_leg_minmax[0],leg[0],d_leg_minmax[1]);		// medida de la pierna: diámetro
h_leg=lim(h_leg_minmax[0],leg[1],h_leg_minmax[1]);		// medida de la pierna: longitud
n_leg=lim(n_leg_minmax[0],leg[2],n_leg_minmax[1]);		// lim:(4<-->16) nº de lados de las piernas

l_foot=lim(l_foot_minmax[0],foot[0],l_foot_minmax[1]);	// medida del pie: longitud	
h_foot=lim(h_foot_minmax[0],foot[1],h_foot_minmax[1]);	// medida del pie: altura (sin contar la altura de la base (heel))

// variables condicionadas a los valores de entrada
//legdtop=legd+1;					// medida de la pierna: grosor superior 
ankle=max(d_leg-5,7);					// medida de la pierna: grosor inferior

w_foot=ankle+5;					// medida del pie: ancho en el talón
w_pointfoot=w_foot*0.7;				// medida del pie: ancho en la punta

l_i_foot=l_foot-(w_pointfoot+w_foot)/2;

heel=3;

h_i_leg=h_leg-h_foot-heel;

// Volumen
rotate([0,0,90])
	union(){
		// Canilla
		translate([0,0,heel+h_foot])
			pyramid_circumscribed (n=n_leg,d2=d_leg,d1=ankle,h=h_i_leg);	
				// Pie			
				difference(){
					hull(){
						translate([0,0,heel/2])
							cube([w_foot,w_foot,heel],center=true);
						translate([0,-l_i_foot,1])
							cube([w_pointfoot,w_pointfoot,2],center=true);
						translate([0,0,heel])
							prism_circumscribed(d=ankle,h=h_foot,n=n_leg);
						}
						hull(){
							cube([w_foot-4,w_foot-4,1.5],center=true);
							translate([0,-l_i_foot,0])								
								cube([w_pointfoot-4,w_pointfoot-4,1.5],center=true);
							}
						}
		}
}

// ------ Fin del módulo leg_quadrangle(leg=[d,h,n],foot=[l,h]) --------
// ----------------------------------------------------------------------




/////////////////////////////////////////////////////////////////////////
/////////////////// Ejemplos de aplicación //////////////////////////////



translate([20,0,0])
	rotate([0,0,90])
		leg_cylindrical(leg=[20,70],foot=[50,8]);

translate([-20,0,0])
	rotate([0,0,90])
		leg_quadrangle(leg=[25,55,4],foot=[45,9]);
